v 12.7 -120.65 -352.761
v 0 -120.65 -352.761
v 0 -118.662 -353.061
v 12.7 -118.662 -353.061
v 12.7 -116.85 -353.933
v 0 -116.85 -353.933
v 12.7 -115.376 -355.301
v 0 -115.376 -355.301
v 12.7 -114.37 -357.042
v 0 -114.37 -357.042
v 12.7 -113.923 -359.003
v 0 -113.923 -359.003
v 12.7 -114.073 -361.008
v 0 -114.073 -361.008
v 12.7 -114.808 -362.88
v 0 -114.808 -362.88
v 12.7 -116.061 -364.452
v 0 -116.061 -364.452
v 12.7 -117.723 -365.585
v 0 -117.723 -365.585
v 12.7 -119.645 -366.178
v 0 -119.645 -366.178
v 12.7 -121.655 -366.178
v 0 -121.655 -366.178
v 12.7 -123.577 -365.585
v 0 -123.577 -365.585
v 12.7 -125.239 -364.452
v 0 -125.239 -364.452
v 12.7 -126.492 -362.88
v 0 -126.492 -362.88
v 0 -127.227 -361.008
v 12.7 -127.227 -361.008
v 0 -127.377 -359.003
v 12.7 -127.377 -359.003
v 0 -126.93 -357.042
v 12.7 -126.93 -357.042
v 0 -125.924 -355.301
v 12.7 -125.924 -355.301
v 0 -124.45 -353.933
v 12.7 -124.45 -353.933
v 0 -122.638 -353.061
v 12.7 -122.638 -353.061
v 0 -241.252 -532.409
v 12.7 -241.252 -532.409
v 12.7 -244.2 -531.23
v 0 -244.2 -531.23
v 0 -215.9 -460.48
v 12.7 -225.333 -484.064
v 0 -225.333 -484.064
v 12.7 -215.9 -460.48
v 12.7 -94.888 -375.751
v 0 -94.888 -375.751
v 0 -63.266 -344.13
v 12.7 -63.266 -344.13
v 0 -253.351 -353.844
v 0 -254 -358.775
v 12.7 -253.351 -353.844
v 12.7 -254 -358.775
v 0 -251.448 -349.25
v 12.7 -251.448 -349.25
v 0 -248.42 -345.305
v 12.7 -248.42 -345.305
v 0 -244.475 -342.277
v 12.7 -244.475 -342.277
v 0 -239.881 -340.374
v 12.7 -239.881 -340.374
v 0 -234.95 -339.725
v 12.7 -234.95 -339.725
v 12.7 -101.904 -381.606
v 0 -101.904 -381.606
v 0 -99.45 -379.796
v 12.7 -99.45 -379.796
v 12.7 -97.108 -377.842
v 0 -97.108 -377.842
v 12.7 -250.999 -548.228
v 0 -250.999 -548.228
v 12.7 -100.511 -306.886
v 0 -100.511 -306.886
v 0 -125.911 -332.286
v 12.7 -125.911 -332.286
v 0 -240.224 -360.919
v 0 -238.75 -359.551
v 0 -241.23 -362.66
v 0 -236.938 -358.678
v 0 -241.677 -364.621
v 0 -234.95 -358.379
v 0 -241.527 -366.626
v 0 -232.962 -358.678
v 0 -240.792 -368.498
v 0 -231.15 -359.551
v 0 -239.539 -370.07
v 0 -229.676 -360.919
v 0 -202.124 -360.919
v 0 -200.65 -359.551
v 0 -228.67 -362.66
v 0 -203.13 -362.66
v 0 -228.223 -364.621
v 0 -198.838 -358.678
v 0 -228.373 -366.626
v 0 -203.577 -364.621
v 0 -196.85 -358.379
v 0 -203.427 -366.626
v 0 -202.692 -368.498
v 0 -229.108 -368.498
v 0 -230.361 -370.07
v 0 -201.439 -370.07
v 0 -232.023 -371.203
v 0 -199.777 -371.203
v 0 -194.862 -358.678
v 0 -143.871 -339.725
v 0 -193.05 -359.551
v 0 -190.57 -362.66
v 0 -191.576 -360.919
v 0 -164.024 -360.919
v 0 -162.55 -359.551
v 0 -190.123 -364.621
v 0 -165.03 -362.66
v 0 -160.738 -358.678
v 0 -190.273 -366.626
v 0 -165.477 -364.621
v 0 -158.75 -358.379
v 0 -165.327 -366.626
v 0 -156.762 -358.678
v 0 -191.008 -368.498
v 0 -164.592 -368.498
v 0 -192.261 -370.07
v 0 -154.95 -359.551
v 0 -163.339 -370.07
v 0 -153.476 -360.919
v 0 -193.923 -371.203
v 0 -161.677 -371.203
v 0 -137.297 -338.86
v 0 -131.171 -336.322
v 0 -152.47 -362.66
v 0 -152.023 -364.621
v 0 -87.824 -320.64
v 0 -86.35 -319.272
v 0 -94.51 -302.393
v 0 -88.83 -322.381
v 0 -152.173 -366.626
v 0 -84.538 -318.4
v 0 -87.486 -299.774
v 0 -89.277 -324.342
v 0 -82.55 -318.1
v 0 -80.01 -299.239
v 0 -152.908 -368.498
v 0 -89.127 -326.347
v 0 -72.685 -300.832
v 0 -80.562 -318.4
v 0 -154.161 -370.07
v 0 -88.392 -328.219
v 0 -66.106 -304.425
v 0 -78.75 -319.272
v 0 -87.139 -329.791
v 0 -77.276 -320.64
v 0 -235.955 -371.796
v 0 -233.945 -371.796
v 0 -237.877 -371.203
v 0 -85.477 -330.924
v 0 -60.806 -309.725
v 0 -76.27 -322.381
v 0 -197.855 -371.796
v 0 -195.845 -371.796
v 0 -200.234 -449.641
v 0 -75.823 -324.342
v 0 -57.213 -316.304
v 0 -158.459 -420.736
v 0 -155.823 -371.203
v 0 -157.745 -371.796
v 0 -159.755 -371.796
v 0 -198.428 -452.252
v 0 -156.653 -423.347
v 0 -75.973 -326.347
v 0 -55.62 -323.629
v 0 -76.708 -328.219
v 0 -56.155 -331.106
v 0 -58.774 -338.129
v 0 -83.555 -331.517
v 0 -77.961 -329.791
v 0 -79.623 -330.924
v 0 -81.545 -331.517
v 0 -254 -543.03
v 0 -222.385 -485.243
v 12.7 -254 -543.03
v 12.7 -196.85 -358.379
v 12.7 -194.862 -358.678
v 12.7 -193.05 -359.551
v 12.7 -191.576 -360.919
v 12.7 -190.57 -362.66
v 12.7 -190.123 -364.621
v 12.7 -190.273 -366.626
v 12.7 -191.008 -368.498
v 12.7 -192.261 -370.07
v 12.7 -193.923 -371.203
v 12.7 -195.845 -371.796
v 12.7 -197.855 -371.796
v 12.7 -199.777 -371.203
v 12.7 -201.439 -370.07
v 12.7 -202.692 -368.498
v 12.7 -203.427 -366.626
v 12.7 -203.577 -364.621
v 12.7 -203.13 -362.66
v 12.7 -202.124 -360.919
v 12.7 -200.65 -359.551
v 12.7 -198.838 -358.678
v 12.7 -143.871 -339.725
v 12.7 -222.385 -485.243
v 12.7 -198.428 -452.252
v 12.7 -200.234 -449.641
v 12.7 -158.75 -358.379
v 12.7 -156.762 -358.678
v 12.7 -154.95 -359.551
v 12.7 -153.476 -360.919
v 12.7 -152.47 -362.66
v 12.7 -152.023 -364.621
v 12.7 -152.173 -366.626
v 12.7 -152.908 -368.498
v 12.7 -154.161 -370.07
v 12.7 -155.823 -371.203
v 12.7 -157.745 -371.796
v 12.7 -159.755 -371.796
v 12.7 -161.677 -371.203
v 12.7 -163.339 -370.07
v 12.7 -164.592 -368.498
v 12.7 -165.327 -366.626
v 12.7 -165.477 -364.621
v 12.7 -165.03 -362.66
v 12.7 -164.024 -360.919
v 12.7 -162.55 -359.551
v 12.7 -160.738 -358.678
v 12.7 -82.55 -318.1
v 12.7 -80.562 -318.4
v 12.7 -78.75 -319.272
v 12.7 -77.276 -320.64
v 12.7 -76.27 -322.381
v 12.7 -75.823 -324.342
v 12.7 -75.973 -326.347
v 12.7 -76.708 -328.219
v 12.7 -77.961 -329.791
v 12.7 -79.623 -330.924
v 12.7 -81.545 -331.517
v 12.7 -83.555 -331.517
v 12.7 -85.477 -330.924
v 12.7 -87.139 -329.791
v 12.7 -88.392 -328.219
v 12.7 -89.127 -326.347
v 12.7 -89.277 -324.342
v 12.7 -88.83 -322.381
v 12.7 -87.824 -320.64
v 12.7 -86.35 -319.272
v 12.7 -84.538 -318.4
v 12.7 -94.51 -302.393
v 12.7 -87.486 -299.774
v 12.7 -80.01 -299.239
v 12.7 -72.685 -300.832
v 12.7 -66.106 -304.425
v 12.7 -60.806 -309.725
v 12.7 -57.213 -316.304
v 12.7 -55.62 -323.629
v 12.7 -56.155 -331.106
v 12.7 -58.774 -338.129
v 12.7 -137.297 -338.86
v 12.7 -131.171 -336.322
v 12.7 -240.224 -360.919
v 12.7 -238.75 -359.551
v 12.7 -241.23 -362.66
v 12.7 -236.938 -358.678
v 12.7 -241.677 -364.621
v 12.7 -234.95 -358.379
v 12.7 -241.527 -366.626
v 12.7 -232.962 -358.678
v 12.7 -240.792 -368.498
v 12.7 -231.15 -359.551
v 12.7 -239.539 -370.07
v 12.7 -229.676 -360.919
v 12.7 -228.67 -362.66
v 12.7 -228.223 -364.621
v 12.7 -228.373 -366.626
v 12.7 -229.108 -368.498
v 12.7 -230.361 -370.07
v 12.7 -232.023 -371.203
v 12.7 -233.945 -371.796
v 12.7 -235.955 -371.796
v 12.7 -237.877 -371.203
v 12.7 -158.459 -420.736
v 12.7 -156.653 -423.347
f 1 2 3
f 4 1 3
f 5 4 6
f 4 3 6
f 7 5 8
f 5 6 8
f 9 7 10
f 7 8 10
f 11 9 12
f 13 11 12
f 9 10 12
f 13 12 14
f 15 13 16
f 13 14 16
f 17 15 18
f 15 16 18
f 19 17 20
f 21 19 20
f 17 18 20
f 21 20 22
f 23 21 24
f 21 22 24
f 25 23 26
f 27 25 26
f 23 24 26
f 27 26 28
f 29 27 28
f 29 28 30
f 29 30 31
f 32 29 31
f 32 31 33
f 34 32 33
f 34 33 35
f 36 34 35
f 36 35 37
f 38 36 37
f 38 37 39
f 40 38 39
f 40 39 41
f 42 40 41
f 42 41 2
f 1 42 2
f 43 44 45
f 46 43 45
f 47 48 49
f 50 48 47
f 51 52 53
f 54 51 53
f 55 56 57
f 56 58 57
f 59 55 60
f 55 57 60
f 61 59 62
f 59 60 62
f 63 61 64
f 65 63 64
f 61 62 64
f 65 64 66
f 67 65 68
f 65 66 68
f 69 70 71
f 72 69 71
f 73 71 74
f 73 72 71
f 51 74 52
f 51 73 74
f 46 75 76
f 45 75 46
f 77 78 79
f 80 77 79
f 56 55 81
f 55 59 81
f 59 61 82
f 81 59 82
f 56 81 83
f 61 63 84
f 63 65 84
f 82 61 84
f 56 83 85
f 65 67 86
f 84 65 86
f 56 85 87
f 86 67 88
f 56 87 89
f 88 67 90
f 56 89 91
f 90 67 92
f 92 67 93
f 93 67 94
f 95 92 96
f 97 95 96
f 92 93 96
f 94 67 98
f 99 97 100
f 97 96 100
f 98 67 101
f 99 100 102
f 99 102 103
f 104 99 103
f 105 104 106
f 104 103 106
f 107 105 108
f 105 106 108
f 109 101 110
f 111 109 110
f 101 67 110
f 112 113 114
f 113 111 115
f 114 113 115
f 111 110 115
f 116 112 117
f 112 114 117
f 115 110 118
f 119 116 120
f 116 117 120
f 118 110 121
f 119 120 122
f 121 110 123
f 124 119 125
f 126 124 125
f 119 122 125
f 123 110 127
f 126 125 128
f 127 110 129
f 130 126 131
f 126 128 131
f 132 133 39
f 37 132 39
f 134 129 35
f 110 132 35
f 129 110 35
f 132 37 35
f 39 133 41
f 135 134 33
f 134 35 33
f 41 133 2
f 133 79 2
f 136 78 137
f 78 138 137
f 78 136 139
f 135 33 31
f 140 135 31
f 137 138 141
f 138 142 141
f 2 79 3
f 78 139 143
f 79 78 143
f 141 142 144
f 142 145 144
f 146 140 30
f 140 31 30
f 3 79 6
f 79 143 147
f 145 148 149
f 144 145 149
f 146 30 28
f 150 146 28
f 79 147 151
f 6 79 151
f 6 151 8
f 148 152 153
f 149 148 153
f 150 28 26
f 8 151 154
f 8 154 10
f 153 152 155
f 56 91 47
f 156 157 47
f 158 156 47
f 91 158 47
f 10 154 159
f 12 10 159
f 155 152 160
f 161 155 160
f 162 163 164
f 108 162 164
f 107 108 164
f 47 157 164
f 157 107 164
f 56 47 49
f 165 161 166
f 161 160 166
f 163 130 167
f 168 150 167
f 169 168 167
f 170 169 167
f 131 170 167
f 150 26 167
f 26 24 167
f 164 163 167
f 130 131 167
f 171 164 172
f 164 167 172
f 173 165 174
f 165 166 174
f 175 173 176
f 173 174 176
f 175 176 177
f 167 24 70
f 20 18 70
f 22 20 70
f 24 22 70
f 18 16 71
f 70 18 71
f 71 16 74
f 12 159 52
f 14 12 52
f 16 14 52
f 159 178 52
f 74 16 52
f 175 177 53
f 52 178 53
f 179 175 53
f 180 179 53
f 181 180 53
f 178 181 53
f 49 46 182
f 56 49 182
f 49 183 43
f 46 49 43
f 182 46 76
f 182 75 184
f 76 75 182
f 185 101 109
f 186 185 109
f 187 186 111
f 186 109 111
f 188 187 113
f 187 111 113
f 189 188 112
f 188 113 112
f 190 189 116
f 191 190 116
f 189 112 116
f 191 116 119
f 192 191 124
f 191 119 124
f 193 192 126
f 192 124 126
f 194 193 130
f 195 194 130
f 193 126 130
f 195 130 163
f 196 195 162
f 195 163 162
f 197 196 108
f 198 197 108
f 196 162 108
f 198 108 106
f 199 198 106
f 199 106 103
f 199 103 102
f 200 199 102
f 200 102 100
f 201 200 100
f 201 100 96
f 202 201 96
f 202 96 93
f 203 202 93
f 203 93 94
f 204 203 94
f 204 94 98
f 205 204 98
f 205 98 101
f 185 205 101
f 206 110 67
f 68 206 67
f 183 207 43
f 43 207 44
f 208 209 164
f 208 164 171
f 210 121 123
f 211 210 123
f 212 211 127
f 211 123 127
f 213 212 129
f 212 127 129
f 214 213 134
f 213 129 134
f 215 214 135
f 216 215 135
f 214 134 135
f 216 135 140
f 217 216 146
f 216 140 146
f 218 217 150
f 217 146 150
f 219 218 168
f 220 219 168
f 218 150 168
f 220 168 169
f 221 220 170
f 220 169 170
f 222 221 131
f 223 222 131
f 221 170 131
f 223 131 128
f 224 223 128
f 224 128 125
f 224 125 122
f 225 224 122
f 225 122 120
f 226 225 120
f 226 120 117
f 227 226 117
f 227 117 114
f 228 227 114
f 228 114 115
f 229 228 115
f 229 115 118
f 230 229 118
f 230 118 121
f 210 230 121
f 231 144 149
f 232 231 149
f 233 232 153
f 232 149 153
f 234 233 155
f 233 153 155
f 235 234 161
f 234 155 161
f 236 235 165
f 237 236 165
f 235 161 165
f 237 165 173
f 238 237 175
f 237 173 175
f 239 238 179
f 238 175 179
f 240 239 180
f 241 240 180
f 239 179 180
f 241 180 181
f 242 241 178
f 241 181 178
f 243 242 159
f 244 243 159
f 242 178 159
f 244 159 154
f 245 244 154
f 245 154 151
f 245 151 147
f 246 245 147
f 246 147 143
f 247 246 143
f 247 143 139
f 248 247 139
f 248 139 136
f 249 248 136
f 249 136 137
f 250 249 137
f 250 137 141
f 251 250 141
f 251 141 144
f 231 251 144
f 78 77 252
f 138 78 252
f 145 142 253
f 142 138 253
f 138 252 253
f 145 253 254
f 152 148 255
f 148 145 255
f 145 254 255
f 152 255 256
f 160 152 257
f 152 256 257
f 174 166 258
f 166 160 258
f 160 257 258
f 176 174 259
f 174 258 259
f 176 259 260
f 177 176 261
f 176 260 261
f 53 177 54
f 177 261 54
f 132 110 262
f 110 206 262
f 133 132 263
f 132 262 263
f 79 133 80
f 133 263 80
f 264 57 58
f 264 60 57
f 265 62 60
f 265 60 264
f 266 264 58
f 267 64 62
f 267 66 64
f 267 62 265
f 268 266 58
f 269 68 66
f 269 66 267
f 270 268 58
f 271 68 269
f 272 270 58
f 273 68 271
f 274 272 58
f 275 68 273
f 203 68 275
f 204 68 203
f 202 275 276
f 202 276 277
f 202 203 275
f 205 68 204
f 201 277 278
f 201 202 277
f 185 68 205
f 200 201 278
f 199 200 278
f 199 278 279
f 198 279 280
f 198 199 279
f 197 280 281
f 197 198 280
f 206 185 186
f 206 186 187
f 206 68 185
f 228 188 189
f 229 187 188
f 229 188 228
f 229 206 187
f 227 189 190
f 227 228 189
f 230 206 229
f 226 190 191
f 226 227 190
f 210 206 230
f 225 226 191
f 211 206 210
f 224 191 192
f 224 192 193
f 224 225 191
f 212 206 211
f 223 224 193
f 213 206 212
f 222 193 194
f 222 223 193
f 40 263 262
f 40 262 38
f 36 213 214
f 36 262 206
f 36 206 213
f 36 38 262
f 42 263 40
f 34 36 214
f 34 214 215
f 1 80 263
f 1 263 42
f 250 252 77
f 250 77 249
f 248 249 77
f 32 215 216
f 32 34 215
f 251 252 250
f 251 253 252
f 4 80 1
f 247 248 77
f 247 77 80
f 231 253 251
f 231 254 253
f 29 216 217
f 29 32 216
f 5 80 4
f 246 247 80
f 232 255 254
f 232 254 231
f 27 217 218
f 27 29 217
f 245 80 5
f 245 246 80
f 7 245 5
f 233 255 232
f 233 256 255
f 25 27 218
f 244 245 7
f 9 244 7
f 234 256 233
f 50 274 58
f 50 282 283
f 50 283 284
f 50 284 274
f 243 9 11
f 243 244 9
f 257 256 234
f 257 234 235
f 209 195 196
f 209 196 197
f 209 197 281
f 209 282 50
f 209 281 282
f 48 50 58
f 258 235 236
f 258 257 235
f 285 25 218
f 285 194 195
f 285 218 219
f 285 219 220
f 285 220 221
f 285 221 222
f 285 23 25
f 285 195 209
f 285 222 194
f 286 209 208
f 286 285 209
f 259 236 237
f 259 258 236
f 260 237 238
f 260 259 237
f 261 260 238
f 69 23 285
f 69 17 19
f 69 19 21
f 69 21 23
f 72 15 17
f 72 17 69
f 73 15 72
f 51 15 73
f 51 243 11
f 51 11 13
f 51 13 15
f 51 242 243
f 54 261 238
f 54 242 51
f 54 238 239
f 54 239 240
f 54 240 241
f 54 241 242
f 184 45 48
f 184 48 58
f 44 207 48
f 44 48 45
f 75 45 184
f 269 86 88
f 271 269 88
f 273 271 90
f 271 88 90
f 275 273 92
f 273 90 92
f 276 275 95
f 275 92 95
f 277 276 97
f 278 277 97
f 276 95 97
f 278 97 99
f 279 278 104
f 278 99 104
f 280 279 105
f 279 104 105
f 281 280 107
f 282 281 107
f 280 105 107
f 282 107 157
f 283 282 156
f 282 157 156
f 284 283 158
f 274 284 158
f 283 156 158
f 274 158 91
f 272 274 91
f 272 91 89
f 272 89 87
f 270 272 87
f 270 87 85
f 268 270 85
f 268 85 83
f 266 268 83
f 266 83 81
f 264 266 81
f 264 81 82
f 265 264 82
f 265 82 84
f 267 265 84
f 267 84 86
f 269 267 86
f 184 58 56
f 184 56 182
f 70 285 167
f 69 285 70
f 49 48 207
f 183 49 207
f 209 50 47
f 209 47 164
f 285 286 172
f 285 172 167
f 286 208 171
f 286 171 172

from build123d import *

# Parameters (mm, degrees)
SKETCH1_R                   = 19.05
BOSS_EXTRUDE1_DEPTH         = 12.7
FILLET1_R                   = 25.4
FILLET2_R                   = 50.8
F_1_2_CLEARANCE_HOLE1_D     = 13.49248
F_1_2_CLEARANCE_HOLE1_DEPTH = 38.1
F_1_2_CLEARANCE_HOLE1_TIP   = 4.053549943
SKETCH4_R                   = 19.05
CUT_EXTRUDE1_DEPTH          = 13.7
BOSS_EXTRUDE2_DEPTH         = 12.7
BOSS_EXTRUDE3_DEPTH         = 12.7
FILLET3_R                   = 19.05
CHAMFER1_SIZE               = 12.7
CHAMFER1_SIZE2              = 8.080195177


with BuildPart() as part:
    # Sketch1 → Boss-Extrude1 (new body)
    with BuildSketch(Plane(origin=(0, 0, 0), x_dir=(0, 0, -1), z_dir=(1, 0, 0))):
        with BuildLine():
            Line((390.630407277, -109.766978243), (305.29908743, -24.435658396))
            Line((305.29908743, -24.435658396), (12.395871839, 49.264412727))
            ThreePointArc((12.395871839, 49.264412727), (-49.470959365, 11.544010545), (-10.688712274, -49.662777107))
            Line((-10.688712274, -49.662777107), (281.610658396, -75.235658396))
            Line((281.610658396, -75.235658396), (339.725, -133.35))
            Line((339.725, -133.35), (339.725, -254))
            Line((339.725, -254), (390.630407277, -254))
            Line((390.630407277, -254), (390.630407277, -109.766978243))
        make_face()
        Circle(SKETCH1_R, mode=Mode.SUBTRACT)
    extrude(amount=BOSS_EXTRUDE1_DEPTH)

    # Fillet1
    fillet1_edges = [part.edges().sort_by_distance(p)[0] for p in [
        (6.35, -133.35, -339.725),
        (6.35, -75.235658396, -281.610658396),
    ]]
    fillet(fillet1_edges, radius=FILLET1_R)

    # Fillet2
    fillet2_edges = [part.edges().sort_by_distance(p)[0] for p in [
        (6.35, -24.435658396, -305.29908743),
        (6.35, -109.766978243, -390.630407277),
    ]]
    fillet(fillet2_edges, radius=FILLET2_R)

    # 1/2 Clearance Hole1
    with Locations(Plane(origin=(12.7, 0, 0), x_dir=(0, 0, -1), z_dir=(1, 0, 0))):
        with Locations((365.125, -234.95), (365.125, -196.85), (365.125, -158.75), (359.5071206, -120.65), (324.846024484, -82.55)):
            Hole(F_1_2_CLEARANCE_HOLE1_D / 2, depth=F_1_2_CLEARANCE_HOLE1_DEPTH)
            with Locations((0, 0, -(F_1_2_CLEARANCE_HOLE1_DEPTH + F_1_2_CLEARANCE_HOLE1_TIP / 2))):  # 118° drill point
                Cone(0, F_1_2_CLEARANCE_HOLE1_D / 2, F_1_2_CLEARANCE_HOLE1_TIP, mode=Mode.SUBTRACT)

    # Sketch4 → Cut-Extrude1 (cut, through all)
    with BuildSketch(Plane(origin=(12.7, 0, 0), x_dir=(0, 0, -1), z_dir=(1, 0, 0))):
        with BuildLine():
            Line((288.147750244, -81.772750244), (306.885512242, -100.510512242))
            ThreePointArc((306.885512242, -100.510512242), (306.885512242, -63.266297725), (344.129726759, -63.266297725))
            Line((344.129726759, -63.266297725), (315.219181895, -34.355752861))
            ThreePointArc((315.219181895, -34.355752861), (304.360921026, -26.089699144), (291.69402925, -21.012364618))
            Line((291.69402925, -21.012364618), (12.395871839, 49.264412727))
            ThreePointArc((12.395871839, 49.264412727), (-49.470959365, 11.544010545), (-10.688712274, -49.662777107))
            Line((-10.688712274, -49.662777107), (272.400993868, -74.429917155))
            ThreePointArc((272.400993868, -74.429917155), (280.92174185, -76.713044696), (288.147750244, -81.772750244))
        make_face()
        Circle(SKETCH4_R, mode=Mode.SUBTRACT)
    extrude(amount=-CUT_EXTRUDE1_DEPTH, mode=Mode.SUBTRACT)

    # Sketch5 → Boss-Extrude2 (add)
    with BuildSketch(Plane(origin=(12.7, 0, 0), x_dir=(0, 0, -1), z_dir=(1, 0, 0))):
        with BuildLine():
            Line((390.630407277, -254), (555.730407277, -254))
            Line((555.730407277, -254), (460.480407277, -215.9))
            Line((460.480407277, -215.9), (381.605516519, -101.904352022))
            ThreePointArc((381.605516519, -101.904352022), (388.321723765, -115.668610267), (390.630407277, -130.809027211))
            Line((390.630407277, -130.809027211), (390.630407277, -254))
        make_face()
    extrude(amount=-BOSS_EXTRUDE2_DEPTH)

    # Sketch6 → Boss-Extrude3 (add)
    with BuildSketch(Plane(origin=(12.7, 0, 0), x_dir=(0, 0, -1), z_dir=(1, 0, 0))):
        Polygon((449.641154081, -200.234334034), (452.252098409, -198.427791835), (423.347423219, -156.652682593), (420.736478891, -158.459224792), align=None)
        Polygon((484.063715226, -225.333323179), (485.242880623, -222.385409686), (532.40949652, -241.252056045), (531.230331123, -244.199969538), align=None)
    extrude(amount=-BOSS_EXTRUDE3_DEPTH)

    # Fillet3
    fillet3_edges = [part.edges().sort_by_distance(p)[0] for p in [
        (6.35, -254, -339.725),
    ]]
    fillet(fillet3_edges, radius=FILLET3_R)

    # Chamfer1
    chamfer1_edges = [part.edges().sort_by_distance(p)[0] for p in [
        (6.35, -254, -555.730407277),
    ]]
    chamfer1_side = [part.faces().sort_by_distance(p)[0] for p in [
        (6.35, -254, -457.252703639),
    ]]
    chamfer(chamfer1_edges, length=CHAMFER1_SIZE, length2=CHAMFER1_SIZE2, reference=chamfer1_side[0])


solid = part.part
